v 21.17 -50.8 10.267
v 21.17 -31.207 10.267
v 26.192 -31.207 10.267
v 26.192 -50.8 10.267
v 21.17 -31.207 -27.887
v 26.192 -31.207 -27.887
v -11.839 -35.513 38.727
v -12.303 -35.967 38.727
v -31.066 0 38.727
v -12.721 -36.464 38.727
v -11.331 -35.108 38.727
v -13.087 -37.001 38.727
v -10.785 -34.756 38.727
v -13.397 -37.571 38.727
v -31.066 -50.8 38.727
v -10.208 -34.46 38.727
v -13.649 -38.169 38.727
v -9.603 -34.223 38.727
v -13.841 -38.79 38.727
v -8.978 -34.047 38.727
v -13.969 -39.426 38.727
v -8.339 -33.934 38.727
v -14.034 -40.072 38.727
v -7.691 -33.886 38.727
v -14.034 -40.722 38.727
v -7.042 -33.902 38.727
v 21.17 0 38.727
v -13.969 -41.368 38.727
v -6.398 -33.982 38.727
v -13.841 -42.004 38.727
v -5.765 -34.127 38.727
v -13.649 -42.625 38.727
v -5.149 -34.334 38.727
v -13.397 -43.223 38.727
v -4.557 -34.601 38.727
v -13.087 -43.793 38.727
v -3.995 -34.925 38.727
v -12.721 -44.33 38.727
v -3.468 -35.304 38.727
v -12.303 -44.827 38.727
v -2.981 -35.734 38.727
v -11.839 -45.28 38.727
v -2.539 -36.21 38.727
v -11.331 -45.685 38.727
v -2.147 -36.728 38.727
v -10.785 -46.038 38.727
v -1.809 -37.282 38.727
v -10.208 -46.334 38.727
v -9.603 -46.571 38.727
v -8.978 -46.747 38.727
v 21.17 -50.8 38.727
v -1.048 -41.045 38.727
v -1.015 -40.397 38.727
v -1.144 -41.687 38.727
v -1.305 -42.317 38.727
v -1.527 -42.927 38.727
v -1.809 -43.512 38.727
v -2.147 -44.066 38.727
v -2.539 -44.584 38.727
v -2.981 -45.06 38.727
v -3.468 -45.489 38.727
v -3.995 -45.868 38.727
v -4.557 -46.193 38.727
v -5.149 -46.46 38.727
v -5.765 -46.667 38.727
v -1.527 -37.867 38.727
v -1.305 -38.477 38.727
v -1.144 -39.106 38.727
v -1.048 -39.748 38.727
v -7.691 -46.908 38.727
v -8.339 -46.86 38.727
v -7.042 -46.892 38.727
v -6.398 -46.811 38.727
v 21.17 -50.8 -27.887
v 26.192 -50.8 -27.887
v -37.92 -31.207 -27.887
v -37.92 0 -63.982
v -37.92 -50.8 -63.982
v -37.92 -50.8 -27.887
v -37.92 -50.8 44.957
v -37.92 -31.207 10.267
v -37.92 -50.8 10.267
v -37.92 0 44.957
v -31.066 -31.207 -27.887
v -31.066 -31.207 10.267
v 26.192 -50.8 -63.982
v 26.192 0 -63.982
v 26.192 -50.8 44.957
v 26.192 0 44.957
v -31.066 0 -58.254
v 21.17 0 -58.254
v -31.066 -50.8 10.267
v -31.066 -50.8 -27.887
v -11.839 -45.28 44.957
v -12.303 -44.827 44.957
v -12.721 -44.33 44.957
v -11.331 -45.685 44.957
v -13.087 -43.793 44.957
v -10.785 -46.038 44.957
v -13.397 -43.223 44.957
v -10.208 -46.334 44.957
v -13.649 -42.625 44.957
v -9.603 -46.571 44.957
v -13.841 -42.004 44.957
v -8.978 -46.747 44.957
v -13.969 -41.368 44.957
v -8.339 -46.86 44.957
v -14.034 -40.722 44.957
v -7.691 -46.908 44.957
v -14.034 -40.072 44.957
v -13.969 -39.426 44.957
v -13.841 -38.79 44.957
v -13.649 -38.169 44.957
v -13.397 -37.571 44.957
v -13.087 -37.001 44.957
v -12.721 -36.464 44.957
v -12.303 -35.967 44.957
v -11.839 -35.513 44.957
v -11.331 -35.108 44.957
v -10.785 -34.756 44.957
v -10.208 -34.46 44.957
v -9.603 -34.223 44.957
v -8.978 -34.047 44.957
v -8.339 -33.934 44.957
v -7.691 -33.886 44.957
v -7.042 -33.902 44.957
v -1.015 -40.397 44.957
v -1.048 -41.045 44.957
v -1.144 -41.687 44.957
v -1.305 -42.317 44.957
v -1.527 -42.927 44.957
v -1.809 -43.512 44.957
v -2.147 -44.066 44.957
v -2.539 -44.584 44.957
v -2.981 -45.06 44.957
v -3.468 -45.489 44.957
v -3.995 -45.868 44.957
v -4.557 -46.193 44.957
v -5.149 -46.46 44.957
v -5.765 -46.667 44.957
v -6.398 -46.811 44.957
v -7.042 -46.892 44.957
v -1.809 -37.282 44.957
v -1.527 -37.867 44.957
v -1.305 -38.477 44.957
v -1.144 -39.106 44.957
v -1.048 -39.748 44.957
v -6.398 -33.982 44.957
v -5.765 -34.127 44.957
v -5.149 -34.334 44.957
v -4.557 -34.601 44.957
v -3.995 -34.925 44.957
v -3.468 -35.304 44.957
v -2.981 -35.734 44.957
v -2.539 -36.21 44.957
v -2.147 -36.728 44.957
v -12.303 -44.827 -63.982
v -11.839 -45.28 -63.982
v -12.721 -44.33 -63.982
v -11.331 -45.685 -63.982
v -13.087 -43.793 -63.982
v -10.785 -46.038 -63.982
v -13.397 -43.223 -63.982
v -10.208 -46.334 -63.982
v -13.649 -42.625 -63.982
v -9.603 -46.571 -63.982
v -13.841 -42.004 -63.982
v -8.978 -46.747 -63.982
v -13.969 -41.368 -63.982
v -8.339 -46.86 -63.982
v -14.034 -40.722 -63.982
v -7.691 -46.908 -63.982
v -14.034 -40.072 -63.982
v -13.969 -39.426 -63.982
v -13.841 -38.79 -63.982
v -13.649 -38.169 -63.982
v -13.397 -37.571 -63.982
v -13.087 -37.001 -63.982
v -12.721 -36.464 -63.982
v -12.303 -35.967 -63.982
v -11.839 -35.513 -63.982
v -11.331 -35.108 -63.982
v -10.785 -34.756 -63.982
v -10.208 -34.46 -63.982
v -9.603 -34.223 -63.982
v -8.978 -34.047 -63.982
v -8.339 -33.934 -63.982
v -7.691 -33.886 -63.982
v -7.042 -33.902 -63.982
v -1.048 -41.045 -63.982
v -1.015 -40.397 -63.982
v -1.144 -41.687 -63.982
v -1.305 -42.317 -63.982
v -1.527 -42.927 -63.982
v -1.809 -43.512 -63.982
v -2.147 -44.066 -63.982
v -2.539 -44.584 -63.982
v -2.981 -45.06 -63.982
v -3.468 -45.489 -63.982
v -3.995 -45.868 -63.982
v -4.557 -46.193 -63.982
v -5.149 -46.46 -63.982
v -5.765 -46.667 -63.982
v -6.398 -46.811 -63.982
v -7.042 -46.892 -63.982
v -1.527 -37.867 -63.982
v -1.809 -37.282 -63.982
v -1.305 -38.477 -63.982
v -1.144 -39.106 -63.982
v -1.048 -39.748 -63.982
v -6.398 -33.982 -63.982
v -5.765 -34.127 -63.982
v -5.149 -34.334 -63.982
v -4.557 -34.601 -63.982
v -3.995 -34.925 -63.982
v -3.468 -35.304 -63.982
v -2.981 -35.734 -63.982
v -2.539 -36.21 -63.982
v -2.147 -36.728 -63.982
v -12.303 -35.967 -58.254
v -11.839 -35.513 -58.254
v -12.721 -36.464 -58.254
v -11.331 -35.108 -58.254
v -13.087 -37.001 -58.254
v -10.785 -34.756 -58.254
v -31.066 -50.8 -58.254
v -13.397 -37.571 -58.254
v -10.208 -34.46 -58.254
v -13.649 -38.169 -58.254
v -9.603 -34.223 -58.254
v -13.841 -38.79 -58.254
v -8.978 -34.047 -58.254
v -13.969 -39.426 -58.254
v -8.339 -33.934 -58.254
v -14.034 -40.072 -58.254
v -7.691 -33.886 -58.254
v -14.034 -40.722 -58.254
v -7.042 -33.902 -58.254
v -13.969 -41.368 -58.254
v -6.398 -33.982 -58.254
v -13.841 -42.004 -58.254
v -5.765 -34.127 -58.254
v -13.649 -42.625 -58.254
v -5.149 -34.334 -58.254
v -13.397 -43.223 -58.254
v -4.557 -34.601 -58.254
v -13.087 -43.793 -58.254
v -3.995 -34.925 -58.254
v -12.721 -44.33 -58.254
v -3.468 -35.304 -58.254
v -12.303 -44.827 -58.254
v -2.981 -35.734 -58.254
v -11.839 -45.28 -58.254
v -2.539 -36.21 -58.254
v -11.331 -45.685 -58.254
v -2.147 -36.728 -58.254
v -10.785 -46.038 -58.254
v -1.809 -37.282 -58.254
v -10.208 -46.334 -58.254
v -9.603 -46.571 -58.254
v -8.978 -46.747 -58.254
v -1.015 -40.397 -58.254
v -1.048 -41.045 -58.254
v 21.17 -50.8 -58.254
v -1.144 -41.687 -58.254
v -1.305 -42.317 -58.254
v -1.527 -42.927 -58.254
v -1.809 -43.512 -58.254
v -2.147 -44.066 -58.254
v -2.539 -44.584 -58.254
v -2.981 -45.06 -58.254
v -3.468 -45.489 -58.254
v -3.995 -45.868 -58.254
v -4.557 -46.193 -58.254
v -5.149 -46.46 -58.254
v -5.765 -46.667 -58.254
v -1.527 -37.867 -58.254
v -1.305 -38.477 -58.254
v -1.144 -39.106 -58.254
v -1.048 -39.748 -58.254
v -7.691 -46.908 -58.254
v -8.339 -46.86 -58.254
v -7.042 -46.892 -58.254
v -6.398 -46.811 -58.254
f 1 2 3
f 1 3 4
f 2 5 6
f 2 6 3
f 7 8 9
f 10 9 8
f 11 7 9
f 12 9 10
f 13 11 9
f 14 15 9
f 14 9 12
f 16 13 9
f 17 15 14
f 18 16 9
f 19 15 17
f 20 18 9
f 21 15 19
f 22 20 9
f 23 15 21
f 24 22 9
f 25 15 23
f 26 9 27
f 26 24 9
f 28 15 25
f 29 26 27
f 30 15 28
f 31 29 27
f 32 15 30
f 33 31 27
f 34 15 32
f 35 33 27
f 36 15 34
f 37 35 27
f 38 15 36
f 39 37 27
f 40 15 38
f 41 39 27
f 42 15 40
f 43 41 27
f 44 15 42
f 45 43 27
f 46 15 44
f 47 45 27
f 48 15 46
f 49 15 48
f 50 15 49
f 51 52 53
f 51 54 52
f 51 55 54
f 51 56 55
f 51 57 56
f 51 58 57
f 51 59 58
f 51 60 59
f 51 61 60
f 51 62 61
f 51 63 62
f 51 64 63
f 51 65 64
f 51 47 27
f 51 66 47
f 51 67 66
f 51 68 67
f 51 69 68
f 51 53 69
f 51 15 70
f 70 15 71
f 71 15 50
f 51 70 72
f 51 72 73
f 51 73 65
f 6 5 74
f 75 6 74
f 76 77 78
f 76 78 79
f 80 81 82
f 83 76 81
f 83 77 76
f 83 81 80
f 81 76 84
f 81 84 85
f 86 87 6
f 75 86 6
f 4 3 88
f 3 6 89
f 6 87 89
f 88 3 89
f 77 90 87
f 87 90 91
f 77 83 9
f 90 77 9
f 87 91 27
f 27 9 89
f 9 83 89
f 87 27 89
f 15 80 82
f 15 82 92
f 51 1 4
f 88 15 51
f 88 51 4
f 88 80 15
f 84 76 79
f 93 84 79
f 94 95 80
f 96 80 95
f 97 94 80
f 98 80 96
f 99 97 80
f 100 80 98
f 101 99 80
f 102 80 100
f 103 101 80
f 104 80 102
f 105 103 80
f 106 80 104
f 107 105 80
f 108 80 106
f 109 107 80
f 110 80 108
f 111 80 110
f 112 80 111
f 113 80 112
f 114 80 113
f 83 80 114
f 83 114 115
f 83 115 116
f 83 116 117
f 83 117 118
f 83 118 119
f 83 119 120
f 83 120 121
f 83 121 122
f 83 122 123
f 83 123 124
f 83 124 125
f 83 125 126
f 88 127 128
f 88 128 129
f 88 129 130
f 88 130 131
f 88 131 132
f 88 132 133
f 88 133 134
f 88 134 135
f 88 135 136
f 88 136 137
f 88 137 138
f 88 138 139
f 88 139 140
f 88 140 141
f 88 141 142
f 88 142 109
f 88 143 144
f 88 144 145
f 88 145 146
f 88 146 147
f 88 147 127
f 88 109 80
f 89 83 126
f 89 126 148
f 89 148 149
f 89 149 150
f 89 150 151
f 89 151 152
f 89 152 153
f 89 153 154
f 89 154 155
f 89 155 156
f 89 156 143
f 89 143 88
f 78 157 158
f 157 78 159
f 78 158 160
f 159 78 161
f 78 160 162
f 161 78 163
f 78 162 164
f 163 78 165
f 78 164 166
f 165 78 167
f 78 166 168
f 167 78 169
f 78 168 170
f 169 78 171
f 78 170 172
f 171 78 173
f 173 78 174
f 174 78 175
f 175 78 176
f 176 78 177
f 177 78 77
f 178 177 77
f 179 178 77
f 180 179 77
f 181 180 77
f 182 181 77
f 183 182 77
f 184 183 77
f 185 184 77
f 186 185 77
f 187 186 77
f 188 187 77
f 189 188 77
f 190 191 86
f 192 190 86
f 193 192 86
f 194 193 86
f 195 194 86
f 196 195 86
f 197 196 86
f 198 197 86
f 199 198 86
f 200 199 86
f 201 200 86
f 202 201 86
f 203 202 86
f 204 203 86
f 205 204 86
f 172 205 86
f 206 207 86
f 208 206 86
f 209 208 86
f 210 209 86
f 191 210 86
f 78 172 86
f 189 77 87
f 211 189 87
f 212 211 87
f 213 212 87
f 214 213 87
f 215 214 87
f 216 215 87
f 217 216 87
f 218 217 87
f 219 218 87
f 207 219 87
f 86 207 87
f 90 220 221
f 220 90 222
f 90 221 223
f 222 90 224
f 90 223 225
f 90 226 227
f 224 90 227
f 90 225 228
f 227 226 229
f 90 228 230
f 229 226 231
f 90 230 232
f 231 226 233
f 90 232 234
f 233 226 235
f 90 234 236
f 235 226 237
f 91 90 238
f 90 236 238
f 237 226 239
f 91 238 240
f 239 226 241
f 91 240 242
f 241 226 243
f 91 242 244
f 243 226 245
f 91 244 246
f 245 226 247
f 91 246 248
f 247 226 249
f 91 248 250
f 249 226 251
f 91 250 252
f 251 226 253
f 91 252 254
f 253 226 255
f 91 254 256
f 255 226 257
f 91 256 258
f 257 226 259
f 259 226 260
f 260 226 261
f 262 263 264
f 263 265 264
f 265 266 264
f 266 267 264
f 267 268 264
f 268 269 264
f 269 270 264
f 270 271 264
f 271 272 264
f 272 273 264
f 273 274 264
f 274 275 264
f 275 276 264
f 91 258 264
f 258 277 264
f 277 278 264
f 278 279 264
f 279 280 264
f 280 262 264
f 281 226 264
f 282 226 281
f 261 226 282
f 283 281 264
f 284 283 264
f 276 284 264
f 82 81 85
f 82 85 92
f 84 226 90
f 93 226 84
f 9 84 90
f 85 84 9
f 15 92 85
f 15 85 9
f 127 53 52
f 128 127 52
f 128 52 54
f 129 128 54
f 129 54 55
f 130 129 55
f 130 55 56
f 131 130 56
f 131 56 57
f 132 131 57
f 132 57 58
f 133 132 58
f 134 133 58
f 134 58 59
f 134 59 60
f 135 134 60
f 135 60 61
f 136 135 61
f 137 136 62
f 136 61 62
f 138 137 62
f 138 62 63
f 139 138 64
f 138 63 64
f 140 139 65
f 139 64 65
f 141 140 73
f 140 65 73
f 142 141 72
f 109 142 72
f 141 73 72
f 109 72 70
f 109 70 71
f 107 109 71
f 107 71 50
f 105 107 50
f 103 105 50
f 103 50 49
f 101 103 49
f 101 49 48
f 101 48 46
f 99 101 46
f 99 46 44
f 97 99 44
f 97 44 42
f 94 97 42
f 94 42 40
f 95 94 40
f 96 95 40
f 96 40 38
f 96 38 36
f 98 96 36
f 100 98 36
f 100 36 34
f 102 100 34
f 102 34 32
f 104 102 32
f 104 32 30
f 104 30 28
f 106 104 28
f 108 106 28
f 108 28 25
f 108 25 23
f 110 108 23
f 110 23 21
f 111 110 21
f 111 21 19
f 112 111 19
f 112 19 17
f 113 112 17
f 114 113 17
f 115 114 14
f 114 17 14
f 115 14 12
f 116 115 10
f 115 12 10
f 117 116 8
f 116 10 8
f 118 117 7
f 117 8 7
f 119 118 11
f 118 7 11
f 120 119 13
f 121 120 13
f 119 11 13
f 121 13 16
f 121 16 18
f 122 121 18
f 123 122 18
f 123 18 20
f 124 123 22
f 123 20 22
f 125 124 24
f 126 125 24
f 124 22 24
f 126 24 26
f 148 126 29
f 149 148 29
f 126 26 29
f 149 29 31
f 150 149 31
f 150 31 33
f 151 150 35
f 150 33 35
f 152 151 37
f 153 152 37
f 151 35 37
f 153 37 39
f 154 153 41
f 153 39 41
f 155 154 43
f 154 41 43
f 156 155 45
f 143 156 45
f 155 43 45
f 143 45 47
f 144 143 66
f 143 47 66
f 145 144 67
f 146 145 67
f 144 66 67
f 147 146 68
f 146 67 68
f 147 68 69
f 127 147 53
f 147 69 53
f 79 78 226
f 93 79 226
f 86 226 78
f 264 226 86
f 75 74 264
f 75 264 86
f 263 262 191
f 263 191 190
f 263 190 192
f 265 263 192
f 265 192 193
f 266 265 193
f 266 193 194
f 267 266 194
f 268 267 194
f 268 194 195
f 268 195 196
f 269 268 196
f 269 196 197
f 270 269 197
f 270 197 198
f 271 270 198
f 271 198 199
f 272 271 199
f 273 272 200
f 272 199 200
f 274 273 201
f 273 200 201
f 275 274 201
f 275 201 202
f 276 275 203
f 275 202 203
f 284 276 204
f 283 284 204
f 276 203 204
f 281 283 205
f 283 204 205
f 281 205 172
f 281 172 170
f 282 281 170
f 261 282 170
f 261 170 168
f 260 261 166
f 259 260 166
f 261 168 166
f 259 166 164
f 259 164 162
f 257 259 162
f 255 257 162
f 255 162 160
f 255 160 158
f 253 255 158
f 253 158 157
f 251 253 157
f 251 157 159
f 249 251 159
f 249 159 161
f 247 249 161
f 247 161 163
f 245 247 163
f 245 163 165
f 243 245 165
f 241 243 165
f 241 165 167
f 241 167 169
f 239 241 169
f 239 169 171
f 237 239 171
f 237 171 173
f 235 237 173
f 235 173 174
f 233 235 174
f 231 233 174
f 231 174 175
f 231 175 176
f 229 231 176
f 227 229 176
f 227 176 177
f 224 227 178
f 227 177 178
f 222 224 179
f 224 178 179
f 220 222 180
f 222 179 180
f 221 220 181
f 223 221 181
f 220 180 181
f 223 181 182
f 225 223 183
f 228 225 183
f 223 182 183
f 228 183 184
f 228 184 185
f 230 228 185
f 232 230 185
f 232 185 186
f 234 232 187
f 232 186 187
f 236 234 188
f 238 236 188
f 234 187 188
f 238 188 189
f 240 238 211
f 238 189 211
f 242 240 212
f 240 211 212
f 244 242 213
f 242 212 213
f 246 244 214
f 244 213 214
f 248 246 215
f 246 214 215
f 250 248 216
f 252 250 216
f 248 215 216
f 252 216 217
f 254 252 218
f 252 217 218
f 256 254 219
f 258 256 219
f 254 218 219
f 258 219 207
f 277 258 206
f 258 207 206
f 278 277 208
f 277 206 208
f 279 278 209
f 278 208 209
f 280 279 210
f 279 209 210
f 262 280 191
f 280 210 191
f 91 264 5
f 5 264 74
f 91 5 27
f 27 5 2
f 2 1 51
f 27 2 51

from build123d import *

# Parameters (mm, degrees)
F0_W     = 64.112249
F0_H     = 108.938705
F1_DEPTH = 50.8
F3_W     = 52.236052
F3_H     = 96.981097
F4_DEPTH = 131.318
F2_W     = 19.592841
F2_H     = 38.154388
F5_DEPTH = 116.078
F6_R     = 6.513385
F7_DEPTH = 143.51


with BuildPart() as f1:
    # F0 (on Front) → F1 (new body)
    with BuildSketch(Plane.XZ):
        with Locations((-5.863925, -9.51259)):
            Rectangle(F0_W, F0_H)
    extrude(amount=F1_DEPTH)

    # F3 (on face) → F4 (cut)
    with BuildSketch(Plane.XZ.offset(50.8)):
        with Locations((-4.947773, -9.76373)):
            Rectangle(F3_W, F3_H)
    extrude(amount=-F4_DEPTH, mode=Mode.SUBTRACT)

    # F2 (on face) → F5 (cut)
    with BuildSketch(Plane(origin=(-37.92005, 0, 0), x_dir=(0, -1, 0), z_dir=(-1, 0, 0))):
        with Locations((41.00358, -8.810162)):
            Rectangle(F2_W, F2_H)
    extrude(amount=-F5_DEPTH, mode=Mode.SUBTRACT)

    # F6 (on face) → F7 (cut)
    with BuildSketch(Plane(origin=(0, 0, -63.981943), x_dir=(1, 0, 0), z_dir=(0, 0, -1))):
        with Locations((-7.528701, 40.396869)):
            Circle(F6_R)
    extrude(amount=-F7_DEPTH, mode=Mode.SUBTRACT)


solid = f1.part
